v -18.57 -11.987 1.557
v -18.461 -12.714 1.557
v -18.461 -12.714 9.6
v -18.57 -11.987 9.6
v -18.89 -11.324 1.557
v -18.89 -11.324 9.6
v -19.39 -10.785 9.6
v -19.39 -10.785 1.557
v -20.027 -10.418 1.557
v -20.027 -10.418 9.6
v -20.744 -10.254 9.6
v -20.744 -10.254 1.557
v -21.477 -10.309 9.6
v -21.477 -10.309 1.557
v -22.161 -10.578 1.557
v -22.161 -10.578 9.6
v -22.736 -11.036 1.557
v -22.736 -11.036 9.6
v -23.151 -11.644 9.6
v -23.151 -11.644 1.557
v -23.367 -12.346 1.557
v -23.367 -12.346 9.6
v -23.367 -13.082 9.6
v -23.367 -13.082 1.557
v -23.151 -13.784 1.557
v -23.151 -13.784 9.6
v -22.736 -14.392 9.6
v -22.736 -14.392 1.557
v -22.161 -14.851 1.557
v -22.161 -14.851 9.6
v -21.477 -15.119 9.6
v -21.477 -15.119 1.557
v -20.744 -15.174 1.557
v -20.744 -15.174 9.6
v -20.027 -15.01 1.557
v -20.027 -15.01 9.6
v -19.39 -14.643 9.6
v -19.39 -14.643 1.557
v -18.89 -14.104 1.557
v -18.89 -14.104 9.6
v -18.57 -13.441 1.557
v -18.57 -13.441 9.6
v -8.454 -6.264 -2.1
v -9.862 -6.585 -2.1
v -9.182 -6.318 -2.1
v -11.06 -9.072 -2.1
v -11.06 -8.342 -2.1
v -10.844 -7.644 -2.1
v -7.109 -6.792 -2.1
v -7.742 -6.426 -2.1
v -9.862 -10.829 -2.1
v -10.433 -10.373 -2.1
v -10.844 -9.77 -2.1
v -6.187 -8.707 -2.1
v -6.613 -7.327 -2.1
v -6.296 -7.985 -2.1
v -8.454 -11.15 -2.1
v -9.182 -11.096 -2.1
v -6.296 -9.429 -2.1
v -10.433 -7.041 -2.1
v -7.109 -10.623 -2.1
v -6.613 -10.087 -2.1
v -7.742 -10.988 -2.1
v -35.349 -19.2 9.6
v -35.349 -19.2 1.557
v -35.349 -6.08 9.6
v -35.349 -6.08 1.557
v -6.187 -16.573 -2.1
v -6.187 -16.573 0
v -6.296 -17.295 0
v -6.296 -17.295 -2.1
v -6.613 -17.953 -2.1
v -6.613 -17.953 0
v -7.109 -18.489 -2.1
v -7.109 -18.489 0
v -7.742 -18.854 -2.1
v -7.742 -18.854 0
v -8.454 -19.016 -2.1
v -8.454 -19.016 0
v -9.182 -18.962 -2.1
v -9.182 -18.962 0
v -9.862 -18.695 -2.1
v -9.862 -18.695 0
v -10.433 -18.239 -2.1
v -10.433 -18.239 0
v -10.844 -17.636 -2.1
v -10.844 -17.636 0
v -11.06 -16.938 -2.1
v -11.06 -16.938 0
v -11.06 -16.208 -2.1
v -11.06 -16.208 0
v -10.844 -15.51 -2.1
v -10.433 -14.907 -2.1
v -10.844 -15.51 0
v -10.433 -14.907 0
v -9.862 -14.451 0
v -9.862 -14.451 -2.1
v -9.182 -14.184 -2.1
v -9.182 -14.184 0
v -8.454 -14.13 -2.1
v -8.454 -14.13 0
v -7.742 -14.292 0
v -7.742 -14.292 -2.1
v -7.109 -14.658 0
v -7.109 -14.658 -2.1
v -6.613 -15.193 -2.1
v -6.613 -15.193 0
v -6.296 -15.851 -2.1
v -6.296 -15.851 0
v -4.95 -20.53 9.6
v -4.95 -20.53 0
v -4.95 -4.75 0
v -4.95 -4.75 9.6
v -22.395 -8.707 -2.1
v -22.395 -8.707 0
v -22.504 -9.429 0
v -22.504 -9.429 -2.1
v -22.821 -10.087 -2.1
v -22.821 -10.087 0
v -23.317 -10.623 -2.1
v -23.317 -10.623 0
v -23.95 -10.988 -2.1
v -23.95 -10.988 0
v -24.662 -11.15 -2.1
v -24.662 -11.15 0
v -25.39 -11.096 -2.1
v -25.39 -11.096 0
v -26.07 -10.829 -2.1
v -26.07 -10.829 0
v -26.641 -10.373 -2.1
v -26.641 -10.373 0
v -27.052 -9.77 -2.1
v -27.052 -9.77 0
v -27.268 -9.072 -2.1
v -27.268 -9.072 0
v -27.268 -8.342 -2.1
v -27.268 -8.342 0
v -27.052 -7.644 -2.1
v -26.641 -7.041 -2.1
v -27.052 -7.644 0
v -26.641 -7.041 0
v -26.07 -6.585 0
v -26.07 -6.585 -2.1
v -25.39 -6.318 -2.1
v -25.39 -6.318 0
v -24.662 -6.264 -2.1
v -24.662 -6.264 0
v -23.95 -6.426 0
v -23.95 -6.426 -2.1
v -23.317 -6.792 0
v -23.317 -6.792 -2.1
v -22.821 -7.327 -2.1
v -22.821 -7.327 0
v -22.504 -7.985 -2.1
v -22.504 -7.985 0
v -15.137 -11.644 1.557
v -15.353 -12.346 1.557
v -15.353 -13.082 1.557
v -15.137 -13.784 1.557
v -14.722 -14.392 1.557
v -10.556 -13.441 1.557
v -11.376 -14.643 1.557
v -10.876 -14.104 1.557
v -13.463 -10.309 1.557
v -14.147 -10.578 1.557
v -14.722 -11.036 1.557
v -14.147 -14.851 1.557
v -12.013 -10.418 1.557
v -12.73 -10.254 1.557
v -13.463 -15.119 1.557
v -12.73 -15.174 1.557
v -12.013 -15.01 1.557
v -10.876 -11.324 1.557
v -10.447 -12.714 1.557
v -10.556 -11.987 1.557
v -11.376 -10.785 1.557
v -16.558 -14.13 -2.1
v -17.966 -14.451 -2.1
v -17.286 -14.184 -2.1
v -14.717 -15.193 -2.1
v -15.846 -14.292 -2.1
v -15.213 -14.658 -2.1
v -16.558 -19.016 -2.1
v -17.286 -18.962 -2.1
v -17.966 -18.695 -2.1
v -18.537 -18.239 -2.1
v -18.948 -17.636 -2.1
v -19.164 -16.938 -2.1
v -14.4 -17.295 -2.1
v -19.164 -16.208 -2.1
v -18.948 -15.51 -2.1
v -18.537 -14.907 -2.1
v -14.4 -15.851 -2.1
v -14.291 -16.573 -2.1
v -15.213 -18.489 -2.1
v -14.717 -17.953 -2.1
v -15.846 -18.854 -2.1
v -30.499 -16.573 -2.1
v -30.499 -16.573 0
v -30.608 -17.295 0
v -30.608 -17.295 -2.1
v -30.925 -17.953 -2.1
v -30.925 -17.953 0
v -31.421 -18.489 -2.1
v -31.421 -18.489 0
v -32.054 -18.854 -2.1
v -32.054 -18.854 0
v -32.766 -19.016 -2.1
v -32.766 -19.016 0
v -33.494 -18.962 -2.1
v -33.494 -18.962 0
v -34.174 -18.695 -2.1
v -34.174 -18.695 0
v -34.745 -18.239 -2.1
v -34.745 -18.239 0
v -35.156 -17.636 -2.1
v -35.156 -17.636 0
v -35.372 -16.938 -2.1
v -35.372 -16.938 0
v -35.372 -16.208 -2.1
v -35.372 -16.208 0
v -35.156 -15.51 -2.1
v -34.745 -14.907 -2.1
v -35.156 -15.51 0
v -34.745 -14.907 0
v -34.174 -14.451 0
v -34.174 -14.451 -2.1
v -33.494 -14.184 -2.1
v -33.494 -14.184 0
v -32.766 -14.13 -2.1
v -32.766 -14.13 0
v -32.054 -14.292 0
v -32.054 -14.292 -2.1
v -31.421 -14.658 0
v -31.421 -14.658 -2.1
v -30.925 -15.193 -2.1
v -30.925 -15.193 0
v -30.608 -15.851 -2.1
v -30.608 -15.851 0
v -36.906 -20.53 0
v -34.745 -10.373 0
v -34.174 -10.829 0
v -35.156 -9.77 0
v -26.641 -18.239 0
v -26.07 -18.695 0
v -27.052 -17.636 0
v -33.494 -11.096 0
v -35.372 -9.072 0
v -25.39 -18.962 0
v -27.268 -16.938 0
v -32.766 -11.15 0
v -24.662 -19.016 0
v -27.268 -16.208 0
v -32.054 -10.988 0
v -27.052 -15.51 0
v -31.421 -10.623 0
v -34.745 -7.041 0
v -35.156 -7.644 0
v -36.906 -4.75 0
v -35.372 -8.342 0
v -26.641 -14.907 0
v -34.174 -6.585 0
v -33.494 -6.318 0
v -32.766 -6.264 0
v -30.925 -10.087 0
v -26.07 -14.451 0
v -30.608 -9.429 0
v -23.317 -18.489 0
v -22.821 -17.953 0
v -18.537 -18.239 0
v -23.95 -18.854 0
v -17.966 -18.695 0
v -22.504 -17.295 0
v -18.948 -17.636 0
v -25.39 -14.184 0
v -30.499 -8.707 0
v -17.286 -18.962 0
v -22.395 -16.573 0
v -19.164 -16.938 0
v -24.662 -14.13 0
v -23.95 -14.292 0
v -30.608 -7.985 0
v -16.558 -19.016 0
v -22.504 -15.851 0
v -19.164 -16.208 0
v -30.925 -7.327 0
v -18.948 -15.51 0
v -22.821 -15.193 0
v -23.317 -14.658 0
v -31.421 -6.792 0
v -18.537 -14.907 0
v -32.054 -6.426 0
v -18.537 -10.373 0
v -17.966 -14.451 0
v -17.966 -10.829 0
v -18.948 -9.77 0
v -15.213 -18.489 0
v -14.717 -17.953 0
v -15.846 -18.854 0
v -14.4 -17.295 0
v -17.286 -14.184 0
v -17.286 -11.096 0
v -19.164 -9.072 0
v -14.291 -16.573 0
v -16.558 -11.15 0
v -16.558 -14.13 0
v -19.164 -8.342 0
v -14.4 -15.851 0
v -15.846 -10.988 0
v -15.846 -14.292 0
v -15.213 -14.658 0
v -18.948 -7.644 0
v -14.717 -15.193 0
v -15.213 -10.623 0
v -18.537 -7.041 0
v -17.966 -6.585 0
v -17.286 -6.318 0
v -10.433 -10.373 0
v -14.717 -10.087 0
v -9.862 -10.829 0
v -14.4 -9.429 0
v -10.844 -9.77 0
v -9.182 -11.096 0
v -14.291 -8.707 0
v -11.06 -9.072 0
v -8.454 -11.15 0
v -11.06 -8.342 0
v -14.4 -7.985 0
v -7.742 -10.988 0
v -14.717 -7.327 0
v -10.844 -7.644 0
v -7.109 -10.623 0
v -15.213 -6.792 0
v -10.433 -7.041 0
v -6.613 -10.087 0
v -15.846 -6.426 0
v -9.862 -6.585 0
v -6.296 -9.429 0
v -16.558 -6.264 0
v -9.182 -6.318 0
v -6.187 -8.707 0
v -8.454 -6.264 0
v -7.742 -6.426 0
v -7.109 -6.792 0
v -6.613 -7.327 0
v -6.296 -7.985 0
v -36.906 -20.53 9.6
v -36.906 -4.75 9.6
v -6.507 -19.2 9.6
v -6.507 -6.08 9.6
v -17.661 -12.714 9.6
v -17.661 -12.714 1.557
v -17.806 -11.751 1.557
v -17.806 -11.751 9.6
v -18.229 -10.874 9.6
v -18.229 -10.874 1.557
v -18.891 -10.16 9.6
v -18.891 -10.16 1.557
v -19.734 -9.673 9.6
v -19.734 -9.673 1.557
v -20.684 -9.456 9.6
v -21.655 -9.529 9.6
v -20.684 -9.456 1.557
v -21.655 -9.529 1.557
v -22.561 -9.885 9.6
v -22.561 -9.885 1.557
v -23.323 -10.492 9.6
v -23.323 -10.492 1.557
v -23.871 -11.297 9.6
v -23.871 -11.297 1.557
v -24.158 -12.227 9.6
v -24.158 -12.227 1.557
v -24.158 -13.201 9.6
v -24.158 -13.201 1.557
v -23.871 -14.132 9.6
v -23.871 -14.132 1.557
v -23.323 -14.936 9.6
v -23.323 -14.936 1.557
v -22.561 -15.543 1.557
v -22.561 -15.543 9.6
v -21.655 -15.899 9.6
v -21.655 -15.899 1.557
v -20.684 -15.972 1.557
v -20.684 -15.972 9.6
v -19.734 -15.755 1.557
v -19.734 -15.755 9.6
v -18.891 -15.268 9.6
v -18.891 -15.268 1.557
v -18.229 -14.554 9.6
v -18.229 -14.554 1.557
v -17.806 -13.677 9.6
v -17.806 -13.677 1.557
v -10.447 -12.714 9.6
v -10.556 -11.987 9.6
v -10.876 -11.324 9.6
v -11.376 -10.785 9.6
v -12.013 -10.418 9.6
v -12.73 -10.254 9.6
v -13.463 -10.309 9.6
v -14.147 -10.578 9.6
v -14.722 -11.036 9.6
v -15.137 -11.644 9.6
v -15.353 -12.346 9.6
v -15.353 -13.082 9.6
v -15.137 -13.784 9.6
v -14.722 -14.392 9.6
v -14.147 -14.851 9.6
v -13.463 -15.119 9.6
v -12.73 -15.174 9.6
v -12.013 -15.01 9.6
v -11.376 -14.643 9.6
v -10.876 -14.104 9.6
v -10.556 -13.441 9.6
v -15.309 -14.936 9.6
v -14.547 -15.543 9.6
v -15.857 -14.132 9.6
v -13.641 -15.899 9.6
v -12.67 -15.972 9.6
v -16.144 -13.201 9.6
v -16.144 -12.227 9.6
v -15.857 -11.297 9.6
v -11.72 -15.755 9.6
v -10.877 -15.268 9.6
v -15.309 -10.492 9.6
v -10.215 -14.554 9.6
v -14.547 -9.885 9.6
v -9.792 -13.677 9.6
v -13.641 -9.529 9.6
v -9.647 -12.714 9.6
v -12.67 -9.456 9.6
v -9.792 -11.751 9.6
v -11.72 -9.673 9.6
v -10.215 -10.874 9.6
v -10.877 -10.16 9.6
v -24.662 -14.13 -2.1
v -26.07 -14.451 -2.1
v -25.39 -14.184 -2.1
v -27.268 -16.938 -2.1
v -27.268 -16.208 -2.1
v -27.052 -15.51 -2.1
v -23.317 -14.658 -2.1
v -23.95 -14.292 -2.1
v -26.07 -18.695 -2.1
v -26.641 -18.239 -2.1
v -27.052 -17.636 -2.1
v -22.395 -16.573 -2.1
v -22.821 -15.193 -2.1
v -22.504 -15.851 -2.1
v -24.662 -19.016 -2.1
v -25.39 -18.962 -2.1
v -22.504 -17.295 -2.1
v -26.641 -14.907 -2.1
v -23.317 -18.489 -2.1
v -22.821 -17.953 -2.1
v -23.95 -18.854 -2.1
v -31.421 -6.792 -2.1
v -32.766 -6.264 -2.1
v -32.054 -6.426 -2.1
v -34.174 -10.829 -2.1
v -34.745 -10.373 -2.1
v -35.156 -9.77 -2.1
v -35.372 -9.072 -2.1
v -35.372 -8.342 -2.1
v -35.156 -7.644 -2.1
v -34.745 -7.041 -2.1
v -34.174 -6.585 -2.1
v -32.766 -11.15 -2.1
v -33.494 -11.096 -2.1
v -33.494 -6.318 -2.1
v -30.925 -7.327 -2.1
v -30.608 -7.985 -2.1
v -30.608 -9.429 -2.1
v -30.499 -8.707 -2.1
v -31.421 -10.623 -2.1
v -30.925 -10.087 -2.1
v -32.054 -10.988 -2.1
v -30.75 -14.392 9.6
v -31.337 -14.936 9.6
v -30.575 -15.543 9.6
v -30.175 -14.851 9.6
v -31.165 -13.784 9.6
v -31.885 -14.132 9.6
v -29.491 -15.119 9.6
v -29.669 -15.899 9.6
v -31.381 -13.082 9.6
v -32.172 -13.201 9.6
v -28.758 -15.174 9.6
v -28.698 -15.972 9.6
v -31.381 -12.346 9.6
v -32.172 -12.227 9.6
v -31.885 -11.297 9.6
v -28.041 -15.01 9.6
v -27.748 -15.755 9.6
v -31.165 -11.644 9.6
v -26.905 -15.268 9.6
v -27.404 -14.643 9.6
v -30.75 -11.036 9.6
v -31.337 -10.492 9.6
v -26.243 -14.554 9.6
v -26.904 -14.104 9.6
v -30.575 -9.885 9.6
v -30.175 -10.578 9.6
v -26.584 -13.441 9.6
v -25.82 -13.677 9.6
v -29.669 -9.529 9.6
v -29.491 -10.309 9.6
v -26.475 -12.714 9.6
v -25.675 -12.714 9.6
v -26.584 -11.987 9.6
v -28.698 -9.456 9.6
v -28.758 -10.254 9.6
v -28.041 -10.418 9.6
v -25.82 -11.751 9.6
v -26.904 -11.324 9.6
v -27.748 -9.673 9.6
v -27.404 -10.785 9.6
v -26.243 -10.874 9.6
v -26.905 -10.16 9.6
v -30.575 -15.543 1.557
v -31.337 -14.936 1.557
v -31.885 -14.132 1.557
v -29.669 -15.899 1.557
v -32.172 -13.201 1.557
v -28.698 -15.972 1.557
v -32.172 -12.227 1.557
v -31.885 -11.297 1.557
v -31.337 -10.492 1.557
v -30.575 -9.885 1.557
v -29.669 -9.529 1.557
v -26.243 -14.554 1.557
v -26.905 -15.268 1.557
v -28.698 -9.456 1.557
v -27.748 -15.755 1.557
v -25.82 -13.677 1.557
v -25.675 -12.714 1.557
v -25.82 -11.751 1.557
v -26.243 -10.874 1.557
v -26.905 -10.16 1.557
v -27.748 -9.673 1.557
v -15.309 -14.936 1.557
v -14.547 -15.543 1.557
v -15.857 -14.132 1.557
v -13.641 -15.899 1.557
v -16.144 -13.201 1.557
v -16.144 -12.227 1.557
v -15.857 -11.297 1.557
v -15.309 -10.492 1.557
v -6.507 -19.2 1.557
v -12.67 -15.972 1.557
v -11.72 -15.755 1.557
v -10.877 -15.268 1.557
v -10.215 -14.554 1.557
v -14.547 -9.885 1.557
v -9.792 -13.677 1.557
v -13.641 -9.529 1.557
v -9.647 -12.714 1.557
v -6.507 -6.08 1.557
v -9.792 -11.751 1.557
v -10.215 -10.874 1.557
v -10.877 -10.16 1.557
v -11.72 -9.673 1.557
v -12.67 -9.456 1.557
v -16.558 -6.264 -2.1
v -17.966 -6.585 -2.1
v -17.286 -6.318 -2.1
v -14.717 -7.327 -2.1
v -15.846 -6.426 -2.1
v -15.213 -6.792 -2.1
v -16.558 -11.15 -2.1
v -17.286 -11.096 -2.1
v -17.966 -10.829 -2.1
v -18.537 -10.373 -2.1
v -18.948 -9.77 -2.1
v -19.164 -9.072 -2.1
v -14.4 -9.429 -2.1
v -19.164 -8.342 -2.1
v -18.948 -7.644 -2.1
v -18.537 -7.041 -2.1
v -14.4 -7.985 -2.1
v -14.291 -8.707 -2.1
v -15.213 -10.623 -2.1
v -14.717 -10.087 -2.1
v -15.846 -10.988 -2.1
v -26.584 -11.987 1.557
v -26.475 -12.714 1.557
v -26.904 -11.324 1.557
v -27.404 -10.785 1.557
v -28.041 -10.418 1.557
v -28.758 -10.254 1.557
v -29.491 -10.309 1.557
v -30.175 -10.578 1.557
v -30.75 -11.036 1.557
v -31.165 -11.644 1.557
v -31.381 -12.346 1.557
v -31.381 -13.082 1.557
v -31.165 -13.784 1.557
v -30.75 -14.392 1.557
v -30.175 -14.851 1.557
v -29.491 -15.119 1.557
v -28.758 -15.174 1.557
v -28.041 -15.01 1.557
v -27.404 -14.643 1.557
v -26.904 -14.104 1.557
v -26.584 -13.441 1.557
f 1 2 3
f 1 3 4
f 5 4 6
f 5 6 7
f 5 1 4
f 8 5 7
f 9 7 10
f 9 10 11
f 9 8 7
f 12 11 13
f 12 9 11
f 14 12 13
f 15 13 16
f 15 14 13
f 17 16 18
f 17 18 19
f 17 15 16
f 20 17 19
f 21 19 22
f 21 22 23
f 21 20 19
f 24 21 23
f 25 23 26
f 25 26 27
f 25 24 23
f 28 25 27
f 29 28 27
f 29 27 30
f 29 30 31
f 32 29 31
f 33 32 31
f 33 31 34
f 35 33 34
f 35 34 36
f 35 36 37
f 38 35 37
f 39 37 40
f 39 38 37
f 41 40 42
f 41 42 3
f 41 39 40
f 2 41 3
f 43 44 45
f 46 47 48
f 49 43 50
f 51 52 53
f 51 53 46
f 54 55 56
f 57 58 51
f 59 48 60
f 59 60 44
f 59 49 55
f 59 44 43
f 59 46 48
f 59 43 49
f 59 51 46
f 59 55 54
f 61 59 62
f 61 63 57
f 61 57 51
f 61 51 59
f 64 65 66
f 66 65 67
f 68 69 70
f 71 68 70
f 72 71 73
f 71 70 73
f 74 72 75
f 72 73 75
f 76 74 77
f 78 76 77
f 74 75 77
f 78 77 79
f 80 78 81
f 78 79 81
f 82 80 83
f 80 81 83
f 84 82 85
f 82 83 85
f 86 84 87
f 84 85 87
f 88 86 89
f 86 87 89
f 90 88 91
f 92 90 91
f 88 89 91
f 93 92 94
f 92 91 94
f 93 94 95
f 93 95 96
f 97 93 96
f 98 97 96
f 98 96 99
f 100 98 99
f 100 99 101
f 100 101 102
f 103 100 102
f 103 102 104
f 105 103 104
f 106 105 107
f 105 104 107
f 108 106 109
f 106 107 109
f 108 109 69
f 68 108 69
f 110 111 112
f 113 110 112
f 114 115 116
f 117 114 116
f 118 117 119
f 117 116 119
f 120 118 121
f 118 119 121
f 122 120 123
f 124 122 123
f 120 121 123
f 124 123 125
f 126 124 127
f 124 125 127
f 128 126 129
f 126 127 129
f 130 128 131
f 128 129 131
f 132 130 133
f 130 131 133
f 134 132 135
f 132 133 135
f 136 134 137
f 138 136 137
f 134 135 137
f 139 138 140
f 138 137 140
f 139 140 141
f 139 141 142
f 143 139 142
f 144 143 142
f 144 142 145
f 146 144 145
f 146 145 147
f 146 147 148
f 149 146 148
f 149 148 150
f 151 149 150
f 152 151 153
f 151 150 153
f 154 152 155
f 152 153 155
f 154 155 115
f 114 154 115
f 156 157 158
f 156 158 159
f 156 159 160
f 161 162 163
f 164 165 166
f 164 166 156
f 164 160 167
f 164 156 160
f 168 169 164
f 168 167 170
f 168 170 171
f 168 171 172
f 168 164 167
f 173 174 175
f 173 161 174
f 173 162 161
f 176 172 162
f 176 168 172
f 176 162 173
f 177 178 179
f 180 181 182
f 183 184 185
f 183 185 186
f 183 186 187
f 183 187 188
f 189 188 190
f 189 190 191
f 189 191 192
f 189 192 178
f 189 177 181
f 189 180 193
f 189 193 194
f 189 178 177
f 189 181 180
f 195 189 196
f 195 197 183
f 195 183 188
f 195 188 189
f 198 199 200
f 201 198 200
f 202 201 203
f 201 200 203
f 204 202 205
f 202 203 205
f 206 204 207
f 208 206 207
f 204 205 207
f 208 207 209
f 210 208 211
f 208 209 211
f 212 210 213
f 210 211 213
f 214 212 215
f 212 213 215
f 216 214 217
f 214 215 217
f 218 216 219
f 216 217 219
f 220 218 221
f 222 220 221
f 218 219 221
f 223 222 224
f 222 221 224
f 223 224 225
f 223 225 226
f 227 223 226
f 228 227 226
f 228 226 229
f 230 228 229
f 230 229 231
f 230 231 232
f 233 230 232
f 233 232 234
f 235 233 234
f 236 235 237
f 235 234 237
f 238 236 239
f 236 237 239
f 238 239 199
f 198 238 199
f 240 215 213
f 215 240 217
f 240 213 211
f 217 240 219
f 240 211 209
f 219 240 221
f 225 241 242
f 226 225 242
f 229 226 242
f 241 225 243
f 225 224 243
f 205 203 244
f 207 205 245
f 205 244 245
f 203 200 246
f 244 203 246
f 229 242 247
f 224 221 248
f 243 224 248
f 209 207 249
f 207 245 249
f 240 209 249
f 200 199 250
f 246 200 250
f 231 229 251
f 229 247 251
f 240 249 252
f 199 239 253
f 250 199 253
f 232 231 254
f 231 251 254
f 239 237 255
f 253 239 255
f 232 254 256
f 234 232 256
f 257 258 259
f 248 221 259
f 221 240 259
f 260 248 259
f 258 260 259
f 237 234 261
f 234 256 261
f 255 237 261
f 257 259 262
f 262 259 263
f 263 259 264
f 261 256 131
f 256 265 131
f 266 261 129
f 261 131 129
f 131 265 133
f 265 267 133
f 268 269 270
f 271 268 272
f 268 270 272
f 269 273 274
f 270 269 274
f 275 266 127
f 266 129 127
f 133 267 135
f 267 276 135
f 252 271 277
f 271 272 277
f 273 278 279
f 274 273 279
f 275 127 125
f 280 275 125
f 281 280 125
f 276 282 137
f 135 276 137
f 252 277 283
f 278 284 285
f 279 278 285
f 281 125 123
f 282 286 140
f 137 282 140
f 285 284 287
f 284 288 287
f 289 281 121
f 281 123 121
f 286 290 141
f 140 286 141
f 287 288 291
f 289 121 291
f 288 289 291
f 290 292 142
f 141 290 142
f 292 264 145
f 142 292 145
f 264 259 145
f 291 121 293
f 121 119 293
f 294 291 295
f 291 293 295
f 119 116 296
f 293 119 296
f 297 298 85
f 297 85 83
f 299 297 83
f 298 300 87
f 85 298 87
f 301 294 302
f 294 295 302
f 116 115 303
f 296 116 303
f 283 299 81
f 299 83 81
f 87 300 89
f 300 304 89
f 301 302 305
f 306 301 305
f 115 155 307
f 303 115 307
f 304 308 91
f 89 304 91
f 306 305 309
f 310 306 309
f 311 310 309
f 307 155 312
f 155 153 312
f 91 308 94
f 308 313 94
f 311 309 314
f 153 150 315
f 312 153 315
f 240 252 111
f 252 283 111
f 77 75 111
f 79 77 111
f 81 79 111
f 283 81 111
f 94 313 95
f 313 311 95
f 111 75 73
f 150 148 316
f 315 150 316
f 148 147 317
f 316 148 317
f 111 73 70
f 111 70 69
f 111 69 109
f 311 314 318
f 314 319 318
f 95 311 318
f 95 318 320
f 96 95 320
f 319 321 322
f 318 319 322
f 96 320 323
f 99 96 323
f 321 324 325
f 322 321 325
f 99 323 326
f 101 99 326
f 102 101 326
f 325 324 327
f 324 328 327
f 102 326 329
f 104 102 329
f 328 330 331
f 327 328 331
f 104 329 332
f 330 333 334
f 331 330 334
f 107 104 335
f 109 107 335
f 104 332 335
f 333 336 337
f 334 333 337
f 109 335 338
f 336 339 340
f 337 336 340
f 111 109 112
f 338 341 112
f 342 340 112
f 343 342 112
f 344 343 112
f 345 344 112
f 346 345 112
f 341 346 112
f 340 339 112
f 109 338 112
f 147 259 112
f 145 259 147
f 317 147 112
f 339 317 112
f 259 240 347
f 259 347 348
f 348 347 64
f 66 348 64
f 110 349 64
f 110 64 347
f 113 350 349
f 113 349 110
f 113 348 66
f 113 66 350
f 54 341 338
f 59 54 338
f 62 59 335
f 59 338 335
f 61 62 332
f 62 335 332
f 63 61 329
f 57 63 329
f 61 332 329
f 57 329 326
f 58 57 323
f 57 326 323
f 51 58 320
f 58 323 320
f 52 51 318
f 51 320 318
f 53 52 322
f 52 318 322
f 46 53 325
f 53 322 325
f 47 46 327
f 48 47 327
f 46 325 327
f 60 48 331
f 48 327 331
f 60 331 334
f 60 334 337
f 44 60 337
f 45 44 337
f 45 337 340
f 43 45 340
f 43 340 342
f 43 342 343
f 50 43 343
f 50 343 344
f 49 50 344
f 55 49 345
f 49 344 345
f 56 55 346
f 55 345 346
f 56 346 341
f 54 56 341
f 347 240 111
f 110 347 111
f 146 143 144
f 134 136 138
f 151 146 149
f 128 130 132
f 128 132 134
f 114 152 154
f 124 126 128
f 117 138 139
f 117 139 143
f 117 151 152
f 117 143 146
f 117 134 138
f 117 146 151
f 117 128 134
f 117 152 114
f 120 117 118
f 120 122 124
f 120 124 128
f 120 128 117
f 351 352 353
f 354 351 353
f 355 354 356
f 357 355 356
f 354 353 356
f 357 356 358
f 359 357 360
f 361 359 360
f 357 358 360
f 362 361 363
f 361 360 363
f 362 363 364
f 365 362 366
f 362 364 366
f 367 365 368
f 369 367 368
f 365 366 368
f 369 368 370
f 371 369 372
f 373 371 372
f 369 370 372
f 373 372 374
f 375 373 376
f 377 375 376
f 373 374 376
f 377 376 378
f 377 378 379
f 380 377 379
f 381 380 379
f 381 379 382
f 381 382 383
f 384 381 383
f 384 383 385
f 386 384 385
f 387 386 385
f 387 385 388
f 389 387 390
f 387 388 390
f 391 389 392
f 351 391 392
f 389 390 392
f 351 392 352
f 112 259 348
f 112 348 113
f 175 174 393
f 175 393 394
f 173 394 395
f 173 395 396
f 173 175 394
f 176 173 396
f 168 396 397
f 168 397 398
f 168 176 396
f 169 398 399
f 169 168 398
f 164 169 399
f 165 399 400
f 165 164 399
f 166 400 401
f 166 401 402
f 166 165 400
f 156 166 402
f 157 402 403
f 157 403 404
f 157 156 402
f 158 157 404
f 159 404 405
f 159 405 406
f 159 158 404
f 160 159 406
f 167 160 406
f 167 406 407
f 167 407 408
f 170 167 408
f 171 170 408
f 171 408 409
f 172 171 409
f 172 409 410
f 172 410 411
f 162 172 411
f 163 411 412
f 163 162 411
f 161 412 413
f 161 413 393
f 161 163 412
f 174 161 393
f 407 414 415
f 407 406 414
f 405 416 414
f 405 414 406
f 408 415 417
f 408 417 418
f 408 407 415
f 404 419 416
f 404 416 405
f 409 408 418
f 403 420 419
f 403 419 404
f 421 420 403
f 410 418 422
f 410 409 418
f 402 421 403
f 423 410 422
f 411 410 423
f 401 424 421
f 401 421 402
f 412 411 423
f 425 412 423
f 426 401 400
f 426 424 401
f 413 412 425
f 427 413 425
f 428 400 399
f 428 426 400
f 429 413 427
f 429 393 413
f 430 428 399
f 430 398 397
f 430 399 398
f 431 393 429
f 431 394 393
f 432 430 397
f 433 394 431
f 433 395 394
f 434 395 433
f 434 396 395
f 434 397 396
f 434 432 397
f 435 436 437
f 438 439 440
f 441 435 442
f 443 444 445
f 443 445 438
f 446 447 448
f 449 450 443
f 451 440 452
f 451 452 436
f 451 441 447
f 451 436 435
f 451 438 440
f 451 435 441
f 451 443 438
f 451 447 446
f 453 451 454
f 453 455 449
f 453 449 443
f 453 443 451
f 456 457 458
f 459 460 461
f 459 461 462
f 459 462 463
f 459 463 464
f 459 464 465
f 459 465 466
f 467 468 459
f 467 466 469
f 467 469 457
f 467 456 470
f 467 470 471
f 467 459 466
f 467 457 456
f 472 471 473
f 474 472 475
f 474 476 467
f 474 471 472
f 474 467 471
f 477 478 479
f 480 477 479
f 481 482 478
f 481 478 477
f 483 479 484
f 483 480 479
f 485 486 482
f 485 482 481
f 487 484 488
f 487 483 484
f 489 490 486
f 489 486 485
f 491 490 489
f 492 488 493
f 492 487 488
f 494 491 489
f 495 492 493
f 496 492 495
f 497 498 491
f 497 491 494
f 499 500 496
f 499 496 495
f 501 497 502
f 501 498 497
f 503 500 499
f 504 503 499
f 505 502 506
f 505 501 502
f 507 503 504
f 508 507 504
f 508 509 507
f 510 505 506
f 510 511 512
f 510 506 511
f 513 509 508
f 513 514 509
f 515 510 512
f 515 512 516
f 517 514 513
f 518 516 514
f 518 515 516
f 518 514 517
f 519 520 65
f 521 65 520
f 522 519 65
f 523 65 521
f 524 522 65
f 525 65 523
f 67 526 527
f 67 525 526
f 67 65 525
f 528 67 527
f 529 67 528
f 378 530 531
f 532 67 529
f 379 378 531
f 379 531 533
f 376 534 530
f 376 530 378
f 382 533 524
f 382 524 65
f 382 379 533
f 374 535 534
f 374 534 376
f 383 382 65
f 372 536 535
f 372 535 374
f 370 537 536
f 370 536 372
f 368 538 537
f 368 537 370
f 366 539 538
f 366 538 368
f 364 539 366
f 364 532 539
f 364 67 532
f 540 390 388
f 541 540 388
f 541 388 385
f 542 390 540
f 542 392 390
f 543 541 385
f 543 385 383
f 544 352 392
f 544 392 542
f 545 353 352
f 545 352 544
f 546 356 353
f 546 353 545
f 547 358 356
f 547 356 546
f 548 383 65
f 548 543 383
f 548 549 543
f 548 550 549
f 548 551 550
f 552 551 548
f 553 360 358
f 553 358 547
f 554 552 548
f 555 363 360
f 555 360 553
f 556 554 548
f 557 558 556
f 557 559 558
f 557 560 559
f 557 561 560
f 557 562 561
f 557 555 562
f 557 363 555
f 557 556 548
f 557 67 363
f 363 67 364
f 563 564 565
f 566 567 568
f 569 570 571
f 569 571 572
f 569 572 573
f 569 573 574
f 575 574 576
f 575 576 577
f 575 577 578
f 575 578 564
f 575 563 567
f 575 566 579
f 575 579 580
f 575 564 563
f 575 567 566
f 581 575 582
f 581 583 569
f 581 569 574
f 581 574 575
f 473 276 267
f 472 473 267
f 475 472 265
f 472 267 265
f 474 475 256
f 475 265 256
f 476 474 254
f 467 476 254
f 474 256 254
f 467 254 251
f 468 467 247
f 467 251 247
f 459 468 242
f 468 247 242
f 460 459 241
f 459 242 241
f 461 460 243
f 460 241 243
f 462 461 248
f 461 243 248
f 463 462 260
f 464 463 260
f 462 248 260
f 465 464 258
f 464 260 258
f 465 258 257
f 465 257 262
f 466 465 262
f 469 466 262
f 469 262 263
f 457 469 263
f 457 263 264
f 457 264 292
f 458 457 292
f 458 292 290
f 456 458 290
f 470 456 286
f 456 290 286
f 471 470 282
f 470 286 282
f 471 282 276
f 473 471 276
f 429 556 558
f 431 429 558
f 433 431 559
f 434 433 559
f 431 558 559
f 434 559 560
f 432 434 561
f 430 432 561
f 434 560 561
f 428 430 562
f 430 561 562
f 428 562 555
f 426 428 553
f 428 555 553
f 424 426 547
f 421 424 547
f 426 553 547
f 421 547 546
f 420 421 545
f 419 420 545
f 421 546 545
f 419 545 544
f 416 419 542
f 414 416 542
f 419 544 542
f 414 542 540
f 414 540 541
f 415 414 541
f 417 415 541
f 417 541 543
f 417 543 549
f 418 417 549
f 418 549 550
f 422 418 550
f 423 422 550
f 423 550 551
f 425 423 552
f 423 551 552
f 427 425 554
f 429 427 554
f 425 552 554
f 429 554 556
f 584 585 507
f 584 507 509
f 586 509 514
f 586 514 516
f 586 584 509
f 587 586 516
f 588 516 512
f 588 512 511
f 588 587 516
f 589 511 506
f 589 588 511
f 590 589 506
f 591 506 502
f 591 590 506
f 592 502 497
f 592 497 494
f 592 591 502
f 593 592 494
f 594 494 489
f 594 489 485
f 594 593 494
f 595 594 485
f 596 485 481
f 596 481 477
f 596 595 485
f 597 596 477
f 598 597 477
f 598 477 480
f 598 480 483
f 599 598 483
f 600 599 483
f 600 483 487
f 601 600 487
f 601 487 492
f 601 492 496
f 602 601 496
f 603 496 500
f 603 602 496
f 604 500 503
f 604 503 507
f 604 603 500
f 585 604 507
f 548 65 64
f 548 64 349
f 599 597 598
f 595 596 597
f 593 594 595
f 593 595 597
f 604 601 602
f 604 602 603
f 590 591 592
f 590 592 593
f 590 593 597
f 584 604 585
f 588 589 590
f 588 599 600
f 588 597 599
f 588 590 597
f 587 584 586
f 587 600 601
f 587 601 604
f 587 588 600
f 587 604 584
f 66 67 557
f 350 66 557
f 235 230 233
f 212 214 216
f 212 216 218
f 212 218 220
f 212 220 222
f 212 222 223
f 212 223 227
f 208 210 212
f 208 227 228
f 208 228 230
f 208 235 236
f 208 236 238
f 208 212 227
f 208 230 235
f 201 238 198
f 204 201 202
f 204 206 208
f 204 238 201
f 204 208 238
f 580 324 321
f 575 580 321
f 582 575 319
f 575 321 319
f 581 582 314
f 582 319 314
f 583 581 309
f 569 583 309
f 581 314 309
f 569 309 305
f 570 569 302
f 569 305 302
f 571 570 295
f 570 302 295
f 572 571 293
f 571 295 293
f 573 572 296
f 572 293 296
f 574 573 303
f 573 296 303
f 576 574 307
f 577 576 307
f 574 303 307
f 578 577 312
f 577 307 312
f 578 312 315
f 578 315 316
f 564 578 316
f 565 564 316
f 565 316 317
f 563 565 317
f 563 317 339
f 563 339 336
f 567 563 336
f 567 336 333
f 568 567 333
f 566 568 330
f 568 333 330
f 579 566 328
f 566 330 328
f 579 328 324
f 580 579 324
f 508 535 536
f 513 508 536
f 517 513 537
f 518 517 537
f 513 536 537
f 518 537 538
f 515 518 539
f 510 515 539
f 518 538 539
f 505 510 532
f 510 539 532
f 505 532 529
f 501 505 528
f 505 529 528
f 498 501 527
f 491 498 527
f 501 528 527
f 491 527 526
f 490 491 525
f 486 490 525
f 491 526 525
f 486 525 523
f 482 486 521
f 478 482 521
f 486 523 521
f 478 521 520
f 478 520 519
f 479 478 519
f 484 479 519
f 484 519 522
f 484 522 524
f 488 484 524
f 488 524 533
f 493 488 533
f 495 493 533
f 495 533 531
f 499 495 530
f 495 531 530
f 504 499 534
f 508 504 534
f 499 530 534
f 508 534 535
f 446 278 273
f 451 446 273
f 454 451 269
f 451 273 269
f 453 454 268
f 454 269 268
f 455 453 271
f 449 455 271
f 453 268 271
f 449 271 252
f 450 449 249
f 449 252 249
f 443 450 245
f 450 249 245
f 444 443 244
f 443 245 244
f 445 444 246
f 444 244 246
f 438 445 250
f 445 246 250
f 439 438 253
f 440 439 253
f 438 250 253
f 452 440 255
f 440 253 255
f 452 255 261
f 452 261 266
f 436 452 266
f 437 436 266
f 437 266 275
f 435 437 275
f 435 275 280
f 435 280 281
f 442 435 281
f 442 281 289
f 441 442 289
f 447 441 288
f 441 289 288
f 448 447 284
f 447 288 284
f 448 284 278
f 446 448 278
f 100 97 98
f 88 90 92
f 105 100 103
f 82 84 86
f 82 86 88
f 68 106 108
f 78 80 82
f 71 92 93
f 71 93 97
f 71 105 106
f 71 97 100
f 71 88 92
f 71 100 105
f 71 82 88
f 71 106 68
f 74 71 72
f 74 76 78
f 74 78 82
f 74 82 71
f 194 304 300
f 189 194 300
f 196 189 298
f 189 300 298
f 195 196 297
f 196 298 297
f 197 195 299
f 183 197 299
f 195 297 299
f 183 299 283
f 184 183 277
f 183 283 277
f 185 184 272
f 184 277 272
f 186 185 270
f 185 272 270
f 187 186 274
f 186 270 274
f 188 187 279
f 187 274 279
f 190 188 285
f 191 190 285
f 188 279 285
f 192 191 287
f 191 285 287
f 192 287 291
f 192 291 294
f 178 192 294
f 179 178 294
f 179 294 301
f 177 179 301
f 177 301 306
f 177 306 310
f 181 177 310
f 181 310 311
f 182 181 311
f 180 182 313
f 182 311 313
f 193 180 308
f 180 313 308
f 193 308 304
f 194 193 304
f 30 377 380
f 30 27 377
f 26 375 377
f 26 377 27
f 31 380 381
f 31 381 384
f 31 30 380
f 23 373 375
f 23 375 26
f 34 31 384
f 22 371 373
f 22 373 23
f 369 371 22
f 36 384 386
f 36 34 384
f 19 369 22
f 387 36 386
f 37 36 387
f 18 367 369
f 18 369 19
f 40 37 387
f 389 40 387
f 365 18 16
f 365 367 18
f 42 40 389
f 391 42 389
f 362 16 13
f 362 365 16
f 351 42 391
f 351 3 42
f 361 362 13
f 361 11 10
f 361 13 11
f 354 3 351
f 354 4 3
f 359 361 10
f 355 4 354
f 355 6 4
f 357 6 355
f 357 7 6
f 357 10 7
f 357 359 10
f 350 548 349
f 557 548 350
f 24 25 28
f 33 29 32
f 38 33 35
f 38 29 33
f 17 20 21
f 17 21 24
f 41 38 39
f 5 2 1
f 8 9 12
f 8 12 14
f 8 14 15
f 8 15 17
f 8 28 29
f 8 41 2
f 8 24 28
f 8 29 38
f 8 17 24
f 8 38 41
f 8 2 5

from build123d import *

# Parameters (mm, degrees)
F0_W     = 31.956
F0_H     = 15.78
F0_W_2   = 28.842
F0_H_2   = 13.12
F1_DEPTH = 9.6
F2_DEPTH = 25
F3_DEPTH = 1.557
F4_R     = 3.267
F4_R_2   = 2.467
F5_DEPTH = 8.043
F6_R     = 2.45
F7_DEPTH = 2.1


with BuildPart() as f1:
    # F0 (on Top) → F1 (new body)
    with BuildSketch(Plane.XY):
        with Locations((-20.927882, -12.640023)):
            Rectangle(F0_W, F0_H)
        with Locations((-20.927882, -12.640023)):
            Rectangle(F0_W_2, F0_H_2, mode=Mode.SUBTRACT)
        with Locations((-20.927882, -12.640023)):
            Rectangle(F0_W_2, F0_H_2)
    extrude(amount=F1_DEPTH)

    # F0 (on Top) → F2 (cut)
    with BuildSketch(Plane.XY):
        with Locations((-20.927882, -12.640023)):
            Rectangle(F0_W_2, F0_H_2)
    extrude(amount=F2_DEPTH, mode=Mode.SUBTRACT)

    # F0 (on Top) → F3 (join)
    with BuildSketch(Plane.XY):
        with Locations((-20.927882, -12.640023)):
            Rectangle(F0_W_2, F0_H_2)
    extrude(amount=F3_DEPTH)

    # F4 (on face) → F5 (join)
    with BuildSketch(Plane.XY.offset(1.557)):
        with Locations((-28.941882, -12.714023)):
            Circle(F4_R)
        with Locations((-28.941882, -12.714023)):
            Circle(F4_R_2, mode=Mode.SUBTRACT)
        with Locations((-20.927882, -12.714023)):
            Circle(F4_R)
        with Locations((-20.927882, -12.714023)):
            Circle(F4_R_2, mode=Mode.SUBTRACT)
        with Locations((-12.913882, -12.714023)):
            Circle(F4_R)
        with Locations((-12.913882, -12.714023)):
            Circle(F4_R_2, mode=Mode.SUBTRACT)
    extrude(amount=F5_DEPTH)

    # F6 (on face) → F7 (join)
    with BuildSketch(Plane(origin=(0, 0, 0), x_dir=(1, 0, 0), z_dir=(0, 0, -1))):
        with Locations((-32.948882, 16.573023)):
            Circle(F6_R)
        with Locations((-24.844882, 16.573023)):
            Circle(F6_R)
        with Locations((-16.740882, 16.573023)):
            Circle(F6_R)
        with Locations((-8.636882, 16.573023)):
            Circle(F6_R)
        with Locations((-8.636882, 8.707023)):
            Circle(F6_R)
        with Locations((-16.740882, 8.707023)):
            Circle(F6_R)
        with Locations((-24.844882, 8.707023)):
            Circle(F6_R)
        with Locations((-32.948882, 8.707023)):
            Circle(F6_R)
    extrude(amount=F7_DEPTH)


solid = f1.part
